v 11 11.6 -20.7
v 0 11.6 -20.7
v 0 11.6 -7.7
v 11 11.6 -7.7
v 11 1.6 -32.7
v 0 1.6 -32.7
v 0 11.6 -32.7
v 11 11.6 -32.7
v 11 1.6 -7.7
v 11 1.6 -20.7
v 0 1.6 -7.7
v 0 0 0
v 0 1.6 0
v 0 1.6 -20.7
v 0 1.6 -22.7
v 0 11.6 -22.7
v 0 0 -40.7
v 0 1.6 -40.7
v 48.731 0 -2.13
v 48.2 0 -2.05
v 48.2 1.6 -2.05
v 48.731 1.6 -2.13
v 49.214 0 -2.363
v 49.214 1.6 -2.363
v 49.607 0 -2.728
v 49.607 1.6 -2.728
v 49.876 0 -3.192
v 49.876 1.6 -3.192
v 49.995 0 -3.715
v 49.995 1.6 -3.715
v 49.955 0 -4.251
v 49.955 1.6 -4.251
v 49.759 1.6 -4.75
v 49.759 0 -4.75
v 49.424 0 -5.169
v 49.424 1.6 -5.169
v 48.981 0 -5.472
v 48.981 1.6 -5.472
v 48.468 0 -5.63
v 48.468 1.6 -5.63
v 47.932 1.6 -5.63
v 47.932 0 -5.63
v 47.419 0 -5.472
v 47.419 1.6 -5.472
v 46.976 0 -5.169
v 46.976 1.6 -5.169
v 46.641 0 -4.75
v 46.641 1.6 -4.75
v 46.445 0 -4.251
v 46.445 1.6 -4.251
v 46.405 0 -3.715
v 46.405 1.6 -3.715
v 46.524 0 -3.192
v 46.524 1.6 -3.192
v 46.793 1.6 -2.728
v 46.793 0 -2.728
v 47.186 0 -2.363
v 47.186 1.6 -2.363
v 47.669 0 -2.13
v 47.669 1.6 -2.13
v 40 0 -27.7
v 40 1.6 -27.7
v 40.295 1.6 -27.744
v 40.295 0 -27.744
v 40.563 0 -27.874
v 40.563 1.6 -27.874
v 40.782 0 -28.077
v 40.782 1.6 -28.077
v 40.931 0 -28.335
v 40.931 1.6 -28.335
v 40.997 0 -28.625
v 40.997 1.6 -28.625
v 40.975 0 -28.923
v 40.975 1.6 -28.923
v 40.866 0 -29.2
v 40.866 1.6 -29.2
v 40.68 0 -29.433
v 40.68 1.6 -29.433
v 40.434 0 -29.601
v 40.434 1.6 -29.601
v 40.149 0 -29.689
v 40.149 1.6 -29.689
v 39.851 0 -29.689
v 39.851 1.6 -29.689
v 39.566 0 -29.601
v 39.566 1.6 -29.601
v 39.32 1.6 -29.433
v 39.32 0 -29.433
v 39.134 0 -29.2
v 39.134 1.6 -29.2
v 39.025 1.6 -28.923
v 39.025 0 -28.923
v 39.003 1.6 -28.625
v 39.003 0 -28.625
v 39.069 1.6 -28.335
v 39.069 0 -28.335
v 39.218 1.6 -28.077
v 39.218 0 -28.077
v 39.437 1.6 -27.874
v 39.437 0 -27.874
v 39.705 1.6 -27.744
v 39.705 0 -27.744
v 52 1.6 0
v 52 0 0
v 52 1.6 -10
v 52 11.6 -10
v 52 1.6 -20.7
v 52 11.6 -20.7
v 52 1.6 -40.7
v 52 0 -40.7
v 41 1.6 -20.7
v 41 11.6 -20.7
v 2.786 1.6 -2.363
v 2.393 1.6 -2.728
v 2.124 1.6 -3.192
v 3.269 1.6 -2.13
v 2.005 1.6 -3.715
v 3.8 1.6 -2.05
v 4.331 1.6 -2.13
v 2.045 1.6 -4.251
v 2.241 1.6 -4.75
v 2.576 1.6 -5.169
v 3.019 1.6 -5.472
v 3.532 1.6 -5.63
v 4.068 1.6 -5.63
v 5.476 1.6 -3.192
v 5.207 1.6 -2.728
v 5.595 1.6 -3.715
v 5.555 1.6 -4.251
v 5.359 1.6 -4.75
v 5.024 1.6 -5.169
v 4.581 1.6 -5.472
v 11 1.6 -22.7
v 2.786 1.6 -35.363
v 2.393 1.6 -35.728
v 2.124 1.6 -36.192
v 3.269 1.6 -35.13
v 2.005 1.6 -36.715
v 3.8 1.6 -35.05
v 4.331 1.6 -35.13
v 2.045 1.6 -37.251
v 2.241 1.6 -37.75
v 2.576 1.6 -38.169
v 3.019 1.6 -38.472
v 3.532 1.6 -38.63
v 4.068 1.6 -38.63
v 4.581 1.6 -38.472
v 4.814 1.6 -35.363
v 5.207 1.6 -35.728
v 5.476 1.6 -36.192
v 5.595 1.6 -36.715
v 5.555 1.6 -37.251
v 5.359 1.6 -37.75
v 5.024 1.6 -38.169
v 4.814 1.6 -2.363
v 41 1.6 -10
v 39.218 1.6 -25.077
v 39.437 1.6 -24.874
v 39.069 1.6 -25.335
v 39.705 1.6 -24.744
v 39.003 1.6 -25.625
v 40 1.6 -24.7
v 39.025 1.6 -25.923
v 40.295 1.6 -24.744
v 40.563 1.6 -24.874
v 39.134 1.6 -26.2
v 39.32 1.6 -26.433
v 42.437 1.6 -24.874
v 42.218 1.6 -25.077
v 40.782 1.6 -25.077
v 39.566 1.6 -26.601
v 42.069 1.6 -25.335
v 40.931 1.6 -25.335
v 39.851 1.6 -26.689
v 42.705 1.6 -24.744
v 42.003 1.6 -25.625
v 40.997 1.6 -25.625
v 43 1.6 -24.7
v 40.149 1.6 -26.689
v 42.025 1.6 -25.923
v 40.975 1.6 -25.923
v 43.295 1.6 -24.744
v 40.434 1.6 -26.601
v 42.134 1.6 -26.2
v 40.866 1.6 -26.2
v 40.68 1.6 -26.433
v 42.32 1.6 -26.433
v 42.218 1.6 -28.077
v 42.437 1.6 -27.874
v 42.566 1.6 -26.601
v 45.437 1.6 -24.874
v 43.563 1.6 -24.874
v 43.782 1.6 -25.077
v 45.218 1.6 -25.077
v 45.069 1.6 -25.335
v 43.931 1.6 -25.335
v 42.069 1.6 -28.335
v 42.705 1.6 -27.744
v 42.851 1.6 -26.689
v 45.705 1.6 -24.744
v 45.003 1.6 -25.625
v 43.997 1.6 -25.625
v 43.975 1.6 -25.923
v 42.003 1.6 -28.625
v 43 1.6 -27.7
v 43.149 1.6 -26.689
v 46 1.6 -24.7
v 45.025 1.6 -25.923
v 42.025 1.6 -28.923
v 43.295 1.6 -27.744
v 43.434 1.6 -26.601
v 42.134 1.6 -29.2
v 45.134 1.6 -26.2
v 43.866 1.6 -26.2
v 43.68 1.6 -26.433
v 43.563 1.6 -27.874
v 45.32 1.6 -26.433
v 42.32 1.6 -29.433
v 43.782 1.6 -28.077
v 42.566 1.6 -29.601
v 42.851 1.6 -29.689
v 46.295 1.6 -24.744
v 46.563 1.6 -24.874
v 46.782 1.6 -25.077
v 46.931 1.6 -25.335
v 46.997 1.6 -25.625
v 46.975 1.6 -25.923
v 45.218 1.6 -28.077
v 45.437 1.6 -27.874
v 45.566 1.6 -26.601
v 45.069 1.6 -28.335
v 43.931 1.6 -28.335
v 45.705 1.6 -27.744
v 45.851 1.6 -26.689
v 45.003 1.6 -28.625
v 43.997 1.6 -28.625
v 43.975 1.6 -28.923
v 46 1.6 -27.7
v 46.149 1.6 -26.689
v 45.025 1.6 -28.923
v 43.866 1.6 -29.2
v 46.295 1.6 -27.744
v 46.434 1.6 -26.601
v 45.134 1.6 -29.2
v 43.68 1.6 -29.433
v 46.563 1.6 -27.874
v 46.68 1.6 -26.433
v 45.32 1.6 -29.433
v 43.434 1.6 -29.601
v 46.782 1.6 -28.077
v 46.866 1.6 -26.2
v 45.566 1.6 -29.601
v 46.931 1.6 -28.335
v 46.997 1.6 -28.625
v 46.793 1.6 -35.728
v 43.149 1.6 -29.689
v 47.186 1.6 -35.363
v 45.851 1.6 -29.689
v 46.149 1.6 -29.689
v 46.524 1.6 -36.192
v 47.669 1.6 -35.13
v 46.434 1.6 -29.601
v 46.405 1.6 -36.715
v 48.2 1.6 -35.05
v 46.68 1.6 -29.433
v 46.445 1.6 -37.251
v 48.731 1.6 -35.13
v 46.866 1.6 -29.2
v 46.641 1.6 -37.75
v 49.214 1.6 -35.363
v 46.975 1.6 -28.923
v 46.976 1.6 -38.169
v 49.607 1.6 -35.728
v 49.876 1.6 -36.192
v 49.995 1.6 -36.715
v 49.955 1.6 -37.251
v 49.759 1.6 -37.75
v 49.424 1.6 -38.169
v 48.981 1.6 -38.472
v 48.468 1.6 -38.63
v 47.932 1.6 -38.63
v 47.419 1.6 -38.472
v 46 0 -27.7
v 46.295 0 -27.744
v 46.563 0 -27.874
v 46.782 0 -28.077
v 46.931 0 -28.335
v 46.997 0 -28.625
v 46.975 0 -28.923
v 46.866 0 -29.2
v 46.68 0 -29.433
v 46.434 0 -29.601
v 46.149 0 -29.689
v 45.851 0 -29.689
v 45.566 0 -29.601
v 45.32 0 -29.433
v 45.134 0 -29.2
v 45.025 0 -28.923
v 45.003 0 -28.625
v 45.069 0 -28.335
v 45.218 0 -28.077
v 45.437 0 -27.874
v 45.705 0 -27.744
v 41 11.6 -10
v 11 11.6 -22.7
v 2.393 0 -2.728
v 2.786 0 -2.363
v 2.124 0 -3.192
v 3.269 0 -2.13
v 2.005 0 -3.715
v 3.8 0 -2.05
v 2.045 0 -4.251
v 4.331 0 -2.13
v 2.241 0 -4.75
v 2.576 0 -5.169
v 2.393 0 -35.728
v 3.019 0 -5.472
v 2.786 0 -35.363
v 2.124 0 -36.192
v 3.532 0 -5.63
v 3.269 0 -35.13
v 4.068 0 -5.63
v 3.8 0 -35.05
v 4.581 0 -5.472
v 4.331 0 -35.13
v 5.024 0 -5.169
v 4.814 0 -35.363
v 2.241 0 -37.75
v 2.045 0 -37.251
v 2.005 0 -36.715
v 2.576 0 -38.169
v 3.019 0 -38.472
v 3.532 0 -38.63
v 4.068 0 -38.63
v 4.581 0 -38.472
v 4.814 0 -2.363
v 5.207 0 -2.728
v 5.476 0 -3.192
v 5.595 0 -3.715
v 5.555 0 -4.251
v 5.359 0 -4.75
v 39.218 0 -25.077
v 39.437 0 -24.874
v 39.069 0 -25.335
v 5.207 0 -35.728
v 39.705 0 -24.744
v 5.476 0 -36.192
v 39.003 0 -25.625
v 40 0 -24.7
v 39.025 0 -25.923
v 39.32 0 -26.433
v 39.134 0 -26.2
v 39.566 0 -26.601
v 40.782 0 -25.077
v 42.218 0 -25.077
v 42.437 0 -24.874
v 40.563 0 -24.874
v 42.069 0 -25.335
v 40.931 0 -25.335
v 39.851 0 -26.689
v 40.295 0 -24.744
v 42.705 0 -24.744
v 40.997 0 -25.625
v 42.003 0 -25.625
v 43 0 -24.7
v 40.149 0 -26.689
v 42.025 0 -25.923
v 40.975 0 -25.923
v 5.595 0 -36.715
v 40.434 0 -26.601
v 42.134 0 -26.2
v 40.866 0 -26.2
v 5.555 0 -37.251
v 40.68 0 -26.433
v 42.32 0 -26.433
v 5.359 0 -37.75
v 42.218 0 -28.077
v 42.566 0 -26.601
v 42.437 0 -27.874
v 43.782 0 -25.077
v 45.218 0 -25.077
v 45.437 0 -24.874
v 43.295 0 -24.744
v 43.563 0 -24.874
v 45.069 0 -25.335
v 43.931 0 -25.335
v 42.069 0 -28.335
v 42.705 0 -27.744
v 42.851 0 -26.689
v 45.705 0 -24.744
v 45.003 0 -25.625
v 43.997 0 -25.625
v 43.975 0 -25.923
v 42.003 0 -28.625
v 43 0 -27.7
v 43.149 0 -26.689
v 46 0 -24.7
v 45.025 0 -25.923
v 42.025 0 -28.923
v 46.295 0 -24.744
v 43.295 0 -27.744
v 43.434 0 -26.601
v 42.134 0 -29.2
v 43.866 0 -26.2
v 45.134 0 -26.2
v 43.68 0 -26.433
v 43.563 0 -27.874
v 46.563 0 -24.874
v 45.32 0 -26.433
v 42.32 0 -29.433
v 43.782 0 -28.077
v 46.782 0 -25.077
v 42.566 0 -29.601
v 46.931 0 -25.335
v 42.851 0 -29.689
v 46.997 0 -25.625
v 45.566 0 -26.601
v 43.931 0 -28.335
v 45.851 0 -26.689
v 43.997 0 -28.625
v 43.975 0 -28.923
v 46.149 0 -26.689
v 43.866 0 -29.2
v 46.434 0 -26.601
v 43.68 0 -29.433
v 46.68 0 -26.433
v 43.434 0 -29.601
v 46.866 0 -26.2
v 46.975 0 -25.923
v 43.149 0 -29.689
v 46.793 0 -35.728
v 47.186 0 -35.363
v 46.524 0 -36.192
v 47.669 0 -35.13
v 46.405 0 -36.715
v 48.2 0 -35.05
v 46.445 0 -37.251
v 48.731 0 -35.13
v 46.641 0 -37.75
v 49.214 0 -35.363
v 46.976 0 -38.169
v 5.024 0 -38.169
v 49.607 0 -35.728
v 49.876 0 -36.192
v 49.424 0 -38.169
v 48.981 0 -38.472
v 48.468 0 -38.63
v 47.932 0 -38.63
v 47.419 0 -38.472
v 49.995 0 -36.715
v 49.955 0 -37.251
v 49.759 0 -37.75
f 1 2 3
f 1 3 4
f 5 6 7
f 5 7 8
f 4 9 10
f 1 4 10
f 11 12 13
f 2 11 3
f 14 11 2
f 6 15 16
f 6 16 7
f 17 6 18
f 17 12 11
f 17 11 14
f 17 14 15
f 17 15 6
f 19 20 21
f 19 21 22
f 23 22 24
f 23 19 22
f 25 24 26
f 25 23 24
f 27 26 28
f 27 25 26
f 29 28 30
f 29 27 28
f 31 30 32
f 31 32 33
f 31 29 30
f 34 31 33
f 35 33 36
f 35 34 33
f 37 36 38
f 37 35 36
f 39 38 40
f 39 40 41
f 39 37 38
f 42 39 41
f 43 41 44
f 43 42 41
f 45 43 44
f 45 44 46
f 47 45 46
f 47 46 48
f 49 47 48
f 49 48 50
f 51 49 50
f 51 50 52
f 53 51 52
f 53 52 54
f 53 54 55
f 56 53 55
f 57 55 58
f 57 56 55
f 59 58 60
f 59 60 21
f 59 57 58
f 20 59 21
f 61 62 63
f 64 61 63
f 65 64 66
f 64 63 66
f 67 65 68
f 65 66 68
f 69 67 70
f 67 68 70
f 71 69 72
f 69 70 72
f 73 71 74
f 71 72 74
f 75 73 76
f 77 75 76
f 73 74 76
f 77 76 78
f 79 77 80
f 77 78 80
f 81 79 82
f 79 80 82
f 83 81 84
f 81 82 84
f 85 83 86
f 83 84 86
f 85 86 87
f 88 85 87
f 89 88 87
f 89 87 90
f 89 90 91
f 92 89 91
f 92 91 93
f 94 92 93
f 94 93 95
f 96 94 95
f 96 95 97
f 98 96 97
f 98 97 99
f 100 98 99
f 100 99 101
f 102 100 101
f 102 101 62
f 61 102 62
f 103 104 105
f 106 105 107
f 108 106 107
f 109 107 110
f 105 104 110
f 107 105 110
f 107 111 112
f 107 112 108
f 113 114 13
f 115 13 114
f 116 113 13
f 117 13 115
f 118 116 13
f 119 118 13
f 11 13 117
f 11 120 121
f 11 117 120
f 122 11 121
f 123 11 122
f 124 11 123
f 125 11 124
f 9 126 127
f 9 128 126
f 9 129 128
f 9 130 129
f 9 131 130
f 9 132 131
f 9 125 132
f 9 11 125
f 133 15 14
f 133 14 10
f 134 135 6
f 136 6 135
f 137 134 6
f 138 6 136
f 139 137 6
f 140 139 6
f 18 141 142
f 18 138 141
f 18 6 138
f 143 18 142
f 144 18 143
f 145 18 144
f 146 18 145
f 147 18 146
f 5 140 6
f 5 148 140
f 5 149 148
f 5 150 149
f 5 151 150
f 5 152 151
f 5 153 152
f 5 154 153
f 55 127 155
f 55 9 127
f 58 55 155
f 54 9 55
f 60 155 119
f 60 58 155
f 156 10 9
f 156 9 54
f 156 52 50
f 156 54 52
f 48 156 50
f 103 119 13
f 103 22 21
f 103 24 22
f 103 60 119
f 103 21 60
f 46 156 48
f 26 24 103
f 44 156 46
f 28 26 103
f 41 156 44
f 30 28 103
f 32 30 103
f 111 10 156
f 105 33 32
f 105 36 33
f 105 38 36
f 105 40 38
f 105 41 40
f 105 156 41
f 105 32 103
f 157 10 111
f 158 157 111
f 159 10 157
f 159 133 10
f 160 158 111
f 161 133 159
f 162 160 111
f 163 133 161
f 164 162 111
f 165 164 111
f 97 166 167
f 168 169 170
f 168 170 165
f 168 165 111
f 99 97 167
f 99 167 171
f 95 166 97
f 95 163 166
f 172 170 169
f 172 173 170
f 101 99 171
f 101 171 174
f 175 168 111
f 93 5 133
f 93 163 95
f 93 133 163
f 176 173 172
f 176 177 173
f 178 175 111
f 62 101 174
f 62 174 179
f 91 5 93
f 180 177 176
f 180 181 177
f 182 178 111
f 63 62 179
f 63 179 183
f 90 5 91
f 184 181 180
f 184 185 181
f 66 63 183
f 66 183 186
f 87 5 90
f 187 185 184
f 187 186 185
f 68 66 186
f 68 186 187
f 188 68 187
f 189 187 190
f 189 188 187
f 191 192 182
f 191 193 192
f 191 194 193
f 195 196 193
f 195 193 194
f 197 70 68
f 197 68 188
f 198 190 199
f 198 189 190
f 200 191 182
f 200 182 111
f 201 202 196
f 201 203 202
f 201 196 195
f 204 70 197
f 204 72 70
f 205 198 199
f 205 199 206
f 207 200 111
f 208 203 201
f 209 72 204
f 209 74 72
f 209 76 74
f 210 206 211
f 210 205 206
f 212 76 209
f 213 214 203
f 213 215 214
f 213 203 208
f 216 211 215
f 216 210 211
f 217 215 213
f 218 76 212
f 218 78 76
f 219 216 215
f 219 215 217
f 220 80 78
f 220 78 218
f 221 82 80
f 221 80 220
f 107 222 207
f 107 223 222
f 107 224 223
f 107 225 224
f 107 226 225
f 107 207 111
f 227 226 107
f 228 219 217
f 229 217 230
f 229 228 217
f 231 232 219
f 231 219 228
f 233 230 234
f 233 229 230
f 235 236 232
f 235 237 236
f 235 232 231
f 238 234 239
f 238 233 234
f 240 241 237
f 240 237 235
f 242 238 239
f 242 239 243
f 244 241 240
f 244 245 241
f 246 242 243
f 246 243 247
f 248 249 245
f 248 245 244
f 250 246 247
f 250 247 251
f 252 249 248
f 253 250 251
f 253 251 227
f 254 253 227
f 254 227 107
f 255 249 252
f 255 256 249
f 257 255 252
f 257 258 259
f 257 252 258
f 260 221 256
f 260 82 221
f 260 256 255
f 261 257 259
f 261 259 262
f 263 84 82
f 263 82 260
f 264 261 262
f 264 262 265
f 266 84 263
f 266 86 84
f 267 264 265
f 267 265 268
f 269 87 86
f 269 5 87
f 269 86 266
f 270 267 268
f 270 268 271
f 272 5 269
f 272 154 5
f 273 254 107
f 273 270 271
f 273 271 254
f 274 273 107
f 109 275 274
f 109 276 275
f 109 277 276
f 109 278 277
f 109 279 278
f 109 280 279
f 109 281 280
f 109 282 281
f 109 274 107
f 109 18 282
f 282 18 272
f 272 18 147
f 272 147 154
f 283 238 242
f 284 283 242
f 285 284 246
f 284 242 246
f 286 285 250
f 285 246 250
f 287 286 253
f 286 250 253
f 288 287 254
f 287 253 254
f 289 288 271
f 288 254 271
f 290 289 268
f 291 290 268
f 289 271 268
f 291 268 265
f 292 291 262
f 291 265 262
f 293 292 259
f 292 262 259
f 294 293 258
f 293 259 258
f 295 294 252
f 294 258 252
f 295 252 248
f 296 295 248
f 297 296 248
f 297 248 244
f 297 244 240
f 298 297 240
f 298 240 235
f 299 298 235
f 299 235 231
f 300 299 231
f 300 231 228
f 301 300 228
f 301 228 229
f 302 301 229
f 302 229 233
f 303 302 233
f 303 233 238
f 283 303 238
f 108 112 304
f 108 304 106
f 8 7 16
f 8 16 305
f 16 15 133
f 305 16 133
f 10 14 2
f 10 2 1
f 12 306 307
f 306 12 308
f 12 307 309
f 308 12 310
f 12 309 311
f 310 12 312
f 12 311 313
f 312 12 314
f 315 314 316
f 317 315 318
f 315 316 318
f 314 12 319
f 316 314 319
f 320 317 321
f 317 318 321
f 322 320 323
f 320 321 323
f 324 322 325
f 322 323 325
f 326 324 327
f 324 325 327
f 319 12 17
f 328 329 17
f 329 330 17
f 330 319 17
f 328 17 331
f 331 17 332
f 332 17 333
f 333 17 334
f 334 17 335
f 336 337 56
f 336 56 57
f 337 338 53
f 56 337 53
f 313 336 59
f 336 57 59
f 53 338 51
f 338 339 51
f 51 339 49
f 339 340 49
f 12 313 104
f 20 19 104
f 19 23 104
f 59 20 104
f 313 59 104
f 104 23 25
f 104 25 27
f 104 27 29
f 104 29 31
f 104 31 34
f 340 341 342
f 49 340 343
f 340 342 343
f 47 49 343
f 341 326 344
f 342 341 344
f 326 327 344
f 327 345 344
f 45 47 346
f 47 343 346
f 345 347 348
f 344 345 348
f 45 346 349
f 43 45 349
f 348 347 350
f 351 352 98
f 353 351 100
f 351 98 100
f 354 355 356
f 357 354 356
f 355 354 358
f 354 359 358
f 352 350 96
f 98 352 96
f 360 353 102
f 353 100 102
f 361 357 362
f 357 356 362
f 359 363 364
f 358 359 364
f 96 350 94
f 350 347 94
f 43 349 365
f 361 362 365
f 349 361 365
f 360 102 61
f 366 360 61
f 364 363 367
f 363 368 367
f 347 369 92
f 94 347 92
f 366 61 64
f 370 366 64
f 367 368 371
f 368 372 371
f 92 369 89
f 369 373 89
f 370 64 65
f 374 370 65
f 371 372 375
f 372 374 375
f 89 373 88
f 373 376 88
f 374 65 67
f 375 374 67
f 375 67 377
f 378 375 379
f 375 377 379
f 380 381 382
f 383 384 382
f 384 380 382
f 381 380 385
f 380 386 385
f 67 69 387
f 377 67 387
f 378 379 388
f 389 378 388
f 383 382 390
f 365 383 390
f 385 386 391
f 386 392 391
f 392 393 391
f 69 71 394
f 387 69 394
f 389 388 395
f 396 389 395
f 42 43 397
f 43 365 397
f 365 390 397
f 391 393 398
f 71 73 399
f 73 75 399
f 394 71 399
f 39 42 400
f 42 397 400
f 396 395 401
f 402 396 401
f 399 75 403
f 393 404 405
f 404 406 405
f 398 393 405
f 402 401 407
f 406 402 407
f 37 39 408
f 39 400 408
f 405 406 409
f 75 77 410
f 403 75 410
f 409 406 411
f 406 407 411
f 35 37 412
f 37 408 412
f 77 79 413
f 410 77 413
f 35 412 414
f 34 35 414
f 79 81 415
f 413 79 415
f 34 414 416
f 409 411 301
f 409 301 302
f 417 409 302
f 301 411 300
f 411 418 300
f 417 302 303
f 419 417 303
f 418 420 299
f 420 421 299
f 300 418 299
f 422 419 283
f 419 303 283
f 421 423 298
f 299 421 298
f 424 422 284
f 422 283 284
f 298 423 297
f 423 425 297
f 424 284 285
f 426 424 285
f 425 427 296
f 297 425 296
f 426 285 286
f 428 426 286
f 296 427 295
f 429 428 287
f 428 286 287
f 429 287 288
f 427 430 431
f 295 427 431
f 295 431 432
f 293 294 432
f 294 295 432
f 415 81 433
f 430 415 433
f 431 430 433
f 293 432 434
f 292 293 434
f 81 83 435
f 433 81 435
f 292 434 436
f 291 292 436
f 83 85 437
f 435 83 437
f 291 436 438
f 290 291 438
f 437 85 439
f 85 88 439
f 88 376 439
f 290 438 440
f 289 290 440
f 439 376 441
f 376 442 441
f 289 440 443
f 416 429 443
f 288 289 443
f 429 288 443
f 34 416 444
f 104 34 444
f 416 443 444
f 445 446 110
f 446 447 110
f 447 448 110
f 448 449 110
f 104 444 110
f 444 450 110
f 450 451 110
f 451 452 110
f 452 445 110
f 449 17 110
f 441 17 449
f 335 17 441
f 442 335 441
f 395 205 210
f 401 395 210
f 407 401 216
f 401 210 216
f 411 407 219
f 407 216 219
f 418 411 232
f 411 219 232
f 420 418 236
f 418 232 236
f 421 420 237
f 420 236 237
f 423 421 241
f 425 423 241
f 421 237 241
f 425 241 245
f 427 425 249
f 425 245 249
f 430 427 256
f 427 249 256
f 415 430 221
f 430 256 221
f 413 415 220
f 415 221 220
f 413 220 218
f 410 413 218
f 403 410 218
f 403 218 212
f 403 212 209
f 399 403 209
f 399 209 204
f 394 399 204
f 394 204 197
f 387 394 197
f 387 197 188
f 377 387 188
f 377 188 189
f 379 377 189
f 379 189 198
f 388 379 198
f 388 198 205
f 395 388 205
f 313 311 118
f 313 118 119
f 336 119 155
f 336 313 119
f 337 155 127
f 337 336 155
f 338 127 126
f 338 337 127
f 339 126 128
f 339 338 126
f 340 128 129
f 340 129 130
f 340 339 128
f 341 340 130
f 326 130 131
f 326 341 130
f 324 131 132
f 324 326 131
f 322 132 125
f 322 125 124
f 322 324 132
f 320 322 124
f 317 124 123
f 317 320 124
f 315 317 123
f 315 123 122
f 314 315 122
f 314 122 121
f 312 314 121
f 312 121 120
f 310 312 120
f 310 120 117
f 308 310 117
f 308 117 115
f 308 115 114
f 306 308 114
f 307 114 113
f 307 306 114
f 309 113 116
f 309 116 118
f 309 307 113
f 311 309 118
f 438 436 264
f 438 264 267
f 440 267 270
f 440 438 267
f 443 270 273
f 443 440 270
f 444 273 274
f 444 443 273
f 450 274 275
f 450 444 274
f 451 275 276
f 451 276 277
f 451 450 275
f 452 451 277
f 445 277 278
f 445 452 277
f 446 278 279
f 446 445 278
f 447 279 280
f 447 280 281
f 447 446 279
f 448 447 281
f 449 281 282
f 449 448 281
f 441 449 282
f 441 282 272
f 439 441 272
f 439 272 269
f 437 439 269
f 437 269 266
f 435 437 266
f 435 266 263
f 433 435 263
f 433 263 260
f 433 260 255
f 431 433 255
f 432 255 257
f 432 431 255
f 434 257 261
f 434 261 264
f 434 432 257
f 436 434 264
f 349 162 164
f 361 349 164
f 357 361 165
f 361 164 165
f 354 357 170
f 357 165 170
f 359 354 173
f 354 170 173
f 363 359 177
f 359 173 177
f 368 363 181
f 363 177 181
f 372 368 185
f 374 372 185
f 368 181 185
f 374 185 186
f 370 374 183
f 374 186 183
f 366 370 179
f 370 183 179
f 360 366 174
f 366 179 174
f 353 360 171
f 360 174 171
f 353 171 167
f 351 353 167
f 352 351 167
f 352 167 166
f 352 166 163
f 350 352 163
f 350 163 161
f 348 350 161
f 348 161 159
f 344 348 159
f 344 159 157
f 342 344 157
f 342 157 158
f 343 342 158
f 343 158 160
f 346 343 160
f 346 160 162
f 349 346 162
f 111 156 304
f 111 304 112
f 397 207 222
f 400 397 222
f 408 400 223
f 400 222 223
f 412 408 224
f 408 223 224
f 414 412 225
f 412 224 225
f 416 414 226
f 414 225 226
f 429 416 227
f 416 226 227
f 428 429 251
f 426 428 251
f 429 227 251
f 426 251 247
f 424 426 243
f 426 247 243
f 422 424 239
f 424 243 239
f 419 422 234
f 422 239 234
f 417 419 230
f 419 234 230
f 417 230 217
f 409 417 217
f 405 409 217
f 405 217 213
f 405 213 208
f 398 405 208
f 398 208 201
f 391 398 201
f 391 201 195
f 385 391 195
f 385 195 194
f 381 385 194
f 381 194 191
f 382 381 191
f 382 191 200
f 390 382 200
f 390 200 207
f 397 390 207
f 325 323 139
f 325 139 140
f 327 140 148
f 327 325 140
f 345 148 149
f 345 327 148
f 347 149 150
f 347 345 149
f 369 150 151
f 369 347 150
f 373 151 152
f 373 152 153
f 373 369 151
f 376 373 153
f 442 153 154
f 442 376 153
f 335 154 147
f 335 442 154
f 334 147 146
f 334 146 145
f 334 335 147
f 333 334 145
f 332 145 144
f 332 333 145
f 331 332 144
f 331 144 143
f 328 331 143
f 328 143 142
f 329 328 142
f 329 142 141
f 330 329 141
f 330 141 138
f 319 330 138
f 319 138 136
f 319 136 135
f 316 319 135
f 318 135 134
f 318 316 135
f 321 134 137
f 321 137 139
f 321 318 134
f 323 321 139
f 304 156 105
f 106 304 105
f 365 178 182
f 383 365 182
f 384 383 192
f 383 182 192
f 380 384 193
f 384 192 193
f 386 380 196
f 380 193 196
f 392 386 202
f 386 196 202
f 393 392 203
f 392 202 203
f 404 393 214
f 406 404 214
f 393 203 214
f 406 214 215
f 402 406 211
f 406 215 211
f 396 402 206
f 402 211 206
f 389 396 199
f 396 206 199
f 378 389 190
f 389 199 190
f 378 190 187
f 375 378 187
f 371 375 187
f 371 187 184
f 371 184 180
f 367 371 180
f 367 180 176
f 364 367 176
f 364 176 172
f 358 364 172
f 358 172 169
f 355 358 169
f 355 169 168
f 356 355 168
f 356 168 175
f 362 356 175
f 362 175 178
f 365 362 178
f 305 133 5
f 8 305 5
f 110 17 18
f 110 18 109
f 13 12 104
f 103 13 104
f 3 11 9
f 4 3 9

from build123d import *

# Parameters (mm, degrees)
SKETCH1_W           = 52
SKETCH1_H           = 40.7
SKETCH1_R           = 1.8
BOSS_EXTRUDE1_DEPTH = 1.6
SKETCH2_W           = 11
SKETCH2_H           = 10.7
SKETCH2_H_2         = 10
SKETCH2_H_3         = 13
BOSS_EXTRUDE2_DEPTH = 10
SKETCH3_R           = 1
CUT_EXTRUDE1_DEPTH  = 67.786899913


with BuildPart() as part:
    # Sketch1 → Boss-Extrude1 (new body)
    with BuildSketch(Plane(origin=(0, 0, 0), x_dir=(1, 0, 0), z_dir=(0, 1, 0))):
        with Locations((26, 20.35)):
            Rectangle(SKETCH1_W, SKETCH1_H)
        with Locations(Location((3.8, 36.85, 0), (0, 0, 270))):
            Circle(SKETCH1_R, mode=Mode.SUBTRACT)
        with Locations(Location((48.2, 36.85, 0), (0, 0, 270))):
            Circle(SKETCH1_R, mode=Mode.SUBTRACT)
        with Locations(Location((48.2, 3.85, 0), (0, 0, 270))):
            Circle(SKETCH1_R, mode=Mode.SUBTRACT)
        with Locations(Location((3.8, 3.85, 0), (0, 0, 270))):
            Circle(SKETCH1_R, mode=Mode.SUBTRACT)
    extrude(amount=BOSS_EXTRUDE1_DEPTH)

    # Sketch2 → Boss-Extrude2 (add)
    with BuildSketch(Plane(origin=(0, 1.6, 0), x_dir=(1, 0, 0), z_dir=(0, 1, 0))):
        with Locations((46.5, 15.35)):
            Rectangle(SKETCH2_W, SKETCH2_H)
        with Locations((5.5, 27.7)):
            Rectangle(SKETCH2_W, SKETCH2_H_2)
        with Locations((5.5, 14.2)):
            Rectangle(SKETCH2_W, SKETCH2_H_3)
    extrude(amount=BOSS_EXTRUDE2_DEPTH)

    # Sketch3 → Cut-Extrude1 (cut, through all)
    with BuildSketch(Plane(origin=(0, 1.6, 0), x_dir=(1, 0, 0), z_dir=(0, 1, 0))):
        with Locations(Location((46, 25.7, 0), (0, 0, 270))):
            Circle(SKETCH3_R)
        with Locations(Location((43, 25.7, 0), (0, 0, 270))):
            Circle(SKETCH3_R)
        with Locations(Location((40, 25.7, 0), (0, 0, 270))):
            Circle(SKETCH3_R)
        with Locations(Location((43, 28.7, 0), (0, 0, 270))):
            Circle(SKETCH3_R)
        with Locations(Location((40, 28.7, 0), (0, 0, 270))):
            Circle(SKETCH3_R)
        with Locations(Location((46, 28.7, 0), (0, 0, 270))):
            Circle(SKETCH3_R)
    extrude(amount=-CUT_EXTRUDE1_DEPTH, mode=Mode.SUBTRACT)


solid = part.part
